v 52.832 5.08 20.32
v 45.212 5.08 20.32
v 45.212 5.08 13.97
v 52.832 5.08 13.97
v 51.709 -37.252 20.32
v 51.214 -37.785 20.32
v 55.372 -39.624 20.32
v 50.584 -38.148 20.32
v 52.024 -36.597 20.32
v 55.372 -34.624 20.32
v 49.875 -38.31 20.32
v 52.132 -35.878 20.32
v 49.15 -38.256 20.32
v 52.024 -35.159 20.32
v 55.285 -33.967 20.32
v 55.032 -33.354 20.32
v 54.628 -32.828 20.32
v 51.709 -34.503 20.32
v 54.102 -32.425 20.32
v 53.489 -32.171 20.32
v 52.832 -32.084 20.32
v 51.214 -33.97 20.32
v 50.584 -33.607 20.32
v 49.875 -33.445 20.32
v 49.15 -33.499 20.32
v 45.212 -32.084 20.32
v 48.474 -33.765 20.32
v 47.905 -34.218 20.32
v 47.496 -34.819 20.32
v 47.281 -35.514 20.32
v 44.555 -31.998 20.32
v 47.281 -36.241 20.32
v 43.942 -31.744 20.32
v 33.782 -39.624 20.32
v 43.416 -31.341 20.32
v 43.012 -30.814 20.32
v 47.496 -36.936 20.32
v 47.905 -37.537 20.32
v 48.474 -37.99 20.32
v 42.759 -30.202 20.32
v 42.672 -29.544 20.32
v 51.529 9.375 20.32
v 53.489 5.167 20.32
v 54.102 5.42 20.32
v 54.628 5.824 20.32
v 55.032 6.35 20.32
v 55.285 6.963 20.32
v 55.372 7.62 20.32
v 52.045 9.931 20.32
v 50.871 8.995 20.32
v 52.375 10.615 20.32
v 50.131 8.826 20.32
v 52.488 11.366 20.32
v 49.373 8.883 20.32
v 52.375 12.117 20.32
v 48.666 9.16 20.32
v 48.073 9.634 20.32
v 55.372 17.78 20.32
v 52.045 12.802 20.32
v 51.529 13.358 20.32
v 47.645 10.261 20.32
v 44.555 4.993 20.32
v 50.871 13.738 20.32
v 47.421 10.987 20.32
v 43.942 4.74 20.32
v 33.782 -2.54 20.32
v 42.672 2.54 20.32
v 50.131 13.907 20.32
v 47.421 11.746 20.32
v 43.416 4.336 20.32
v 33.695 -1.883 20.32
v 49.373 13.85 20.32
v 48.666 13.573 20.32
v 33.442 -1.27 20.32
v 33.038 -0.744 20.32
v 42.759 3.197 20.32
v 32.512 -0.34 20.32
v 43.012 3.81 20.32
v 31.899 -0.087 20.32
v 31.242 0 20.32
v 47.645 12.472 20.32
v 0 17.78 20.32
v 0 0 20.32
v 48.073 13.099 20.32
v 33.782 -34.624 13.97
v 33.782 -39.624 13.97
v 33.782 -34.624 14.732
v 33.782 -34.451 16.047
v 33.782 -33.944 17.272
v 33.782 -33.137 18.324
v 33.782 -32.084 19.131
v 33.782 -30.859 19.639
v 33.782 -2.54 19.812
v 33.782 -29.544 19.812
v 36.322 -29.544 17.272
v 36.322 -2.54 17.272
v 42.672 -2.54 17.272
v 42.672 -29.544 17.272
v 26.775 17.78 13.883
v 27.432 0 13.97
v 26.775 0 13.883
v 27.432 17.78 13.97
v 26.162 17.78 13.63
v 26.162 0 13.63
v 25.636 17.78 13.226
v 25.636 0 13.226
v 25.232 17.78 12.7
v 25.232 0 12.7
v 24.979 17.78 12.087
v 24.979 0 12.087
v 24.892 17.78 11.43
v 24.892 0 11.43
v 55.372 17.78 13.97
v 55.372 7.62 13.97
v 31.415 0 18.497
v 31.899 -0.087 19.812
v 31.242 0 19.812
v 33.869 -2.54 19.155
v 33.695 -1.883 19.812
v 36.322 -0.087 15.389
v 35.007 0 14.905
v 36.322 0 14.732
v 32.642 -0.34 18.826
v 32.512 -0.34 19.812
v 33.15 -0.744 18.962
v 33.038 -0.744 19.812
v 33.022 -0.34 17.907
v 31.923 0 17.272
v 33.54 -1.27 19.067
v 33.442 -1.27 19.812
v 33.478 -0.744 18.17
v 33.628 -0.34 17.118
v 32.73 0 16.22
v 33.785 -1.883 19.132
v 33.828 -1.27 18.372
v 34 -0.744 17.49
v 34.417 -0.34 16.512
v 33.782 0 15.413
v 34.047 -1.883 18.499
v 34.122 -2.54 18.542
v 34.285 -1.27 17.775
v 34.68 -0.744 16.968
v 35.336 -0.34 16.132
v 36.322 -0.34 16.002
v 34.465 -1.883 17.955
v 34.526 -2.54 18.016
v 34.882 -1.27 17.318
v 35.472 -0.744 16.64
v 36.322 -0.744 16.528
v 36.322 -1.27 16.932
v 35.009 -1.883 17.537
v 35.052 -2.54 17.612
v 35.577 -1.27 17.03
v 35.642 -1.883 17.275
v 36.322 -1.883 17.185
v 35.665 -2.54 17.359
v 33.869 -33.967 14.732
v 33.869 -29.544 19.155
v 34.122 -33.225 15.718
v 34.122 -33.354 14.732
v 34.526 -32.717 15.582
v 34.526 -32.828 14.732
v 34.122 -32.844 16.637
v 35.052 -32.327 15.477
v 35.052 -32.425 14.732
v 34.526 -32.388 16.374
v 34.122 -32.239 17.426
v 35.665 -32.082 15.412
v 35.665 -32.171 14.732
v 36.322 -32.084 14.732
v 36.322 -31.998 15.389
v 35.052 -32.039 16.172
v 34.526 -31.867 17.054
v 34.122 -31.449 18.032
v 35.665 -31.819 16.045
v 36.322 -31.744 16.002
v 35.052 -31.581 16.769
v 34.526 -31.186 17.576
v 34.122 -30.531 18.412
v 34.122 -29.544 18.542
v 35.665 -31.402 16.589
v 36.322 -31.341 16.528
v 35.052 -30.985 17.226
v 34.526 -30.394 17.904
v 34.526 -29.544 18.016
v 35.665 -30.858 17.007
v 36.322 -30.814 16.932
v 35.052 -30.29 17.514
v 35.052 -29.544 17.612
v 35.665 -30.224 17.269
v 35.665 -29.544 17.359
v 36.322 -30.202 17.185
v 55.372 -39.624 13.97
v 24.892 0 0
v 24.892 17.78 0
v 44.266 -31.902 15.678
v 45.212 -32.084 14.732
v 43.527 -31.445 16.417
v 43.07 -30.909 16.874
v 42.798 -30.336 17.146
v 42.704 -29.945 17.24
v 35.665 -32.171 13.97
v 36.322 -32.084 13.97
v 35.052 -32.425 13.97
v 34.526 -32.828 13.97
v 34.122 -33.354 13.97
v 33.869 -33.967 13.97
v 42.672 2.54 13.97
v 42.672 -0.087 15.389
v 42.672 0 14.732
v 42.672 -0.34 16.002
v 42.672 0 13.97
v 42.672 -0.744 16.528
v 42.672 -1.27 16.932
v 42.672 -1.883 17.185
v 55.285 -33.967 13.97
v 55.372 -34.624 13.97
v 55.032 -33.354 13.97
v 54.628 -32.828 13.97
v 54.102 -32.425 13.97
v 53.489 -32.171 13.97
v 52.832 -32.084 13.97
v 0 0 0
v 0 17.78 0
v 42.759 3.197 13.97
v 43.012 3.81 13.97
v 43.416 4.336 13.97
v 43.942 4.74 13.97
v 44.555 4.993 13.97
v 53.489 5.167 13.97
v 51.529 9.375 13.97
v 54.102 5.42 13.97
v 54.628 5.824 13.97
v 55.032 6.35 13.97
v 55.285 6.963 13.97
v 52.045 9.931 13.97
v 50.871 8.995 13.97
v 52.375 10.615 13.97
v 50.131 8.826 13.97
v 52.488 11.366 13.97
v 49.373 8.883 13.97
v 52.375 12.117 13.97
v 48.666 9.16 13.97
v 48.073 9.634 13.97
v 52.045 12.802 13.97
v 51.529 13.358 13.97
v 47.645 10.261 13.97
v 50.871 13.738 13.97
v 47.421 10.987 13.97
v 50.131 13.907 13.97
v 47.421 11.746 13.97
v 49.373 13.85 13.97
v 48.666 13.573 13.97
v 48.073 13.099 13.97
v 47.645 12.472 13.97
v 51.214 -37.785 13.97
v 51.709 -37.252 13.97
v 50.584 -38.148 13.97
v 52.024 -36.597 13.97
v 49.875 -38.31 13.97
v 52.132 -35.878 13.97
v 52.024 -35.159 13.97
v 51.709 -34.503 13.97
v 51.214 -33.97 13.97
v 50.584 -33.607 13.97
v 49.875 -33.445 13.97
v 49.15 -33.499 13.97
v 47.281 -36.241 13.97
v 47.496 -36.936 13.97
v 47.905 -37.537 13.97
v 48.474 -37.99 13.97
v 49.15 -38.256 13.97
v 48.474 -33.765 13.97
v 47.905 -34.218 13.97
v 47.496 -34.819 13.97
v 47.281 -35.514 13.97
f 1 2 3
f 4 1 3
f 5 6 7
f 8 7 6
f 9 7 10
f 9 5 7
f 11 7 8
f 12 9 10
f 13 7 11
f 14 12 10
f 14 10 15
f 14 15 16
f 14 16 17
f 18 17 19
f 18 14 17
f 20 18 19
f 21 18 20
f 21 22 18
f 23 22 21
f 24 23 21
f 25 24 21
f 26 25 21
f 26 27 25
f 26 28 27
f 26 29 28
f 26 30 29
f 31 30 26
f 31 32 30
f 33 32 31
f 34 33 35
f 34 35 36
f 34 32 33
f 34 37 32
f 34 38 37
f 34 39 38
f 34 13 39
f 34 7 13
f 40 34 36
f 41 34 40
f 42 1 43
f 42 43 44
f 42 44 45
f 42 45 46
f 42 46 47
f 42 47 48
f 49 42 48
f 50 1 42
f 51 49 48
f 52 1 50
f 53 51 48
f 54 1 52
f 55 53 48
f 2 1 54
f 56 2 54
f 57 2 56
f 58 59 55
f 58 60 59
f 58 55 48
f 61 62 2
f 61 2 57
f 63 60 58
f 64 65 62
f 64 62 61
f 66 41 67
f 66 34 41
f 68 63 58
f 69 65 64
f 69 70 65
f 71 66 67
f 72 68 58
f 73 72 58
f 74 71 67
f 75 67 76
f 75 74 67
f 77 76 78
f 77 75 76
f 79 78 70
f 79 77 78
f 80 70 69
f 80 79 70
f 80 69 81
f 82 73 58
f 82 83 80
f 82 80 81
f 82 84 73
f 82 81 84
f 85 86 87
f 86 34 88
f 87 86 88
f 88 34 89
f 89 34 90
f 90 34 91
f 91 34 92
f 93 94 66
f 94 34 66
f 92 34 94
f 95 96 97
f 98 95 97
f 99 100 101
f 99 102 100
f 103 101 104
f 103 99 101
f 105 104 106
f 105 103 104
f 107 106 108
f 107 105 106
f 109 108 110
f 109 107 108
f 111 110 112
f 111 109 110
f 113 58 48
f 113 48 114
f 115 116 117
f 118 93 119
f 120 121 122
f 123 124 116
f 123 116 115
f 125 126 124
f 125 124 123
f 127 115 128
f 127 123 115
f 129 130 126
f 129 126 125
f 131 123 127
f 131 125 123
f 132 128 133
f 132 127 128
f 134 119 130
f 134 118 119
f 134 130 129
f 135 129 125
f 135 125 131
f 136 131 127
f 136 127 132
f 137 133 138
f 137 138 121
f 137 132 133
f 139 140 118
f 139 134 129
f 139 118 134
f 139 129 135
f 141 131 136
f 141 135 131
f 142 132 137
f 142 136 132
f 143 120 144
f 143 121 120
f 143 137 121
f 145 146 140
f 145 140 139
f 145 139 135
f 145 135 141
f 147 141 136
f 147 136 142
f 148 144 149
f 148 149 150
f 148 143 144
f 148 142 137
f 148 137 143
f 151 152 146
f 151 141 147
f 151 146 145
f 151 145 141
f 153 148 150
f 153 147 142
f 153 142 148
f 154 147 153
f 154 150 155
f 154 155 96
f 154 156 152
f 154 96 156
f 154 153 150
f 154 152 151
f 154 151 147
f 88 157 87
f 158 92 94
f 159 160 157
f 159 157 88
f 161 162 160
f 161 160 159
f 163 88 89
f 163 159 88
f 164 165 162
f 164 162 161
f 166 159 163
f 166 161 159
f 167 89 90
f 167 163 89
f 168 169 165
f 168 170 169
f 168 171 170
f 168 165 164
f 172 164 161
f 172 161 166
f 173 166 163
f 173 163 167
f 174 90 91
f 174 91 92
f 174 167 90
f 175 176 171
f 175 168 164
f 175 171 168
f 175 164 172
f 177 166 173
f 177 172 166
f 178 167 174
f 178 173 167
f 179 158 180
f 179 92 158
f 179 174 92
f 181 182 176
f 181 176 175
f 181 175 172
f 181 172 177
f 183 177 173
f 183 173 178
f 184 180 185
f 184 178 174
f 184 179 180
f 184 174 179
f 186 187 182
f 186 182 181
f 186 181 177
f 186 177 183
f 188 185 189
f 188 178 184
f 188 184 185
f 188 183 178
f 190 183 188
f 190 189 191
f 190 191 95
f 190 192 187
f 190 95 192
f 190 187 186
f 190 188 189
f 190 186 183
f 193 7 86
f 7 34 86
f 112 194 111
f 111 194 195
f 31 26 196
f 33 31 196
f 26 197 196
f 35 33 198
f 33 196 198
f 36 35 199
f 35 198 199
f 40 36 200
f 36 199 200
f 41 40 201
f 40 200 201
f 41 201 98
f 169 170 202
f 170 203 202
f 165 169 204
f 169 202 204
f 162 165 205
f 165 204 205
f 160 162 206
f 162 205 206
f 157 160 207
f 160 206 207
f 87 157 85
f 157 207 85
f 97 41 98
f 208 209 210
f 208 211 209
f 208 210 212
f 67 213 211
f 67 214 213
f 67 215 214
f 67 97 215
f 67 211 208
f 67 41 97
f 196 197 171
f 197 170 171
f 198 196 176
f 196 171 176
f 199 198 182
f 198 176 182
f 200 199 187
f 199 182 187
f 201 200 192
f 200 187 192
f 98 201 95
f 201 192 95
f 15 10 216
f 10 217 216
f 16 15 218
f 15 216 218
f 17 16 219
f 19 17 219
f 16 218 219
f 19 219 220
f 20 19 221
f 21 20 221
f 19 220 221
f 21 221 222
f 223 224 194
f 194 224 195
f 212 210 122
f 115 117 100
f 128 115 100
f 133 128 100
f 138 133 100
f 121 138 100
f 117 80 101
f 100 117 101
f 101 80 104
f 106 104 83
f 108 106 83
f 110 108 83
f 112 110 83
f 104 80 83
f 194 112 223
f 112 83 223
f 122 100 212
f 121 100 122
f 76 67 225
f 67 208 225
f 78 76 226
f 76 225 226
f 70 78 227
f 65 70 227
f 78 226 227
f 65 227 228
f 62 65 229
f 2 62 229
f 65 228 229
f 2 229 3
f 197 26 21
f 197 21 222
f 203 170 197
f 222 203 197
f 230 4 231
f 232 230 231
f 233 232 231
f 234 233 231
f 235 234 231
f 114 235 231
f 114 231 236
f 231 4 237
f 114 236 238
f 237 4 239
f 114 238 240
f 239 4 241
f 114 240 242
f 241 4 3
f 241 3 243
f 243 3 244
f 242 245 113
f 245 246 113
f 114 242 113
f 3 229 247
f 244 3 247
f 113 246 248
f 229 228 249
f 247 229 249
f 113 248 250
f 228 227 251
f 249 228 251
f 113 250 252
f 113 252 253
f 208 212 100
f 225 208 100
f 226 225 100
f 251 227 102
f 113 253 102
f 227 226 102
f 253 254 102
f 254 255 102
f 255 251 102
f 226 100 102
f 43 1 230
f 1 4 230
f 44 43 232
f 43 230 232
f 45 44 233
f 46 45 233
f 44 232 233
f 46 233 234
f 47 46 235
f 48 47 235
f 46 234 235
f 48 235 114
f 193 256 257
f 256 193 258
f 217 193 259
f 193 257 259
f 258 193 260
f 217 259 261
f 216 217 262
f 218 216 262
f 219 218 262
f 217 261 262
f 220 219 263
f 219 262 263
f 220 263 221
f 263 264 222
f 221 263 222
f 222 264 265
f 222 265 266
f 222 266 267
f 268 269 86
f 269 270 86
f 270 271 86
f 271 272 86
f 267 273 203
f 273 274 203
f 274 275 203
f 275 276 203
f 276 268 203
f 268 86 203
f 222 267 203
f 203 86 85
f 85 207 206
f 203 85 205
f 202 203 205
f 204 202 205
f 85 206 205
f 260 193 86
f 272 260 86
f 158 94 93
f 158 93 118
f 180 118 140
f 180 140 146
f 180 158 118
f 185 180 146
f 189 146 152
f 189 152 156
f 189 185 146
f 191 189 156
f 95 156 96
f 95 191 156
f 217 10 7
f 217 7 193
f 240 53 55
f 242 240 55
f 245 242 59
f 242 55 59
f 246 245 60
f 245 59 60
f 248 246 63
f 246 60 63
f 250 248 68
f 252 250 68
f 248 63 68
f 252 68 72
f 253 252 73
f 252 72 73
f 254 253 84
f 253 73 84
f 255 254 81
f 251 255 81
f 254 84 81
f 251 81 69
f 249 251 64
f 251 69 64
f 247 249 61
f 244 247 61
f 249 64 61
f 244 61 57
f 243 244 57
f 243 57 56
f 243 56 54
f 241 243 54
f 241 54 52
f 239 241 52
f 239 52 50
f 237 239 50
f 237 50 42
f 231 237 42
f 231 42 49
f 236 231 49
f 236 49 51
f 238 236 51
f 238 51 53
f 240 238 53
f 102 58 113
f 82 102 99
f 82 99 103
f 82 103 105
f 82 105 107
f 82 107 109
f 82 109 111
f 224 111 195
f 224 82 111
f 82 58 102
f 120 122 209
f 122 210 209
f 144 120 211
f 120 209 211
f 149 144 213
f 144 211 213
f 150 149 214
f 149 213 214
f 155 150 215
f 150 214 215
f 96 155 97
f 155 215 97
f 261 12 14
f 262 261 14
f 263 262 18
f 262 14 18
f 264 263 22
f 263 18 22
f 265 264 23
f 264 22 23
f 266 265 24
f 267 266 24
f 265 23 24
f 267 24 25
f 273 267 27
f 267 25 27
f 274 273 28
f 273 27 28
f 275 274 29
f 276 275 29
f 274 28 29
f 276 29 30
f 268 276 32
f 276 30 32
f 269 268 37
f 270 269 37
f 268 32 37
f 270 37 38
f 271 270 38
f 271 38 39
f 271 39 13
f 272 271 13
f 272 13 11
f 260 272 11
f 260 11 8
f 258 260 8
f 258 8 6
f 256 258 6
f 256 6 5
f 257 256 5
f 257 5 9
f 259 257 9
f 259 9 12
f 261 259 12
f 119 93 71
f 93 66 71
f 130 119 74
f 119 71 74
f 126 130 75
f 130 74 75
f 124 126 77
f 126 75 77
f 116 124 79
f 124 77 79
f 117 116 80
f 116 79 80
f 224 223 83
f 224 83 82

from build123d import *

# Parameters (mm, degrees)
SKETCH1_W            = 24.892
SKETCH1_H            = 17.78
BOSS_EXTRUDE1_DEPTH  = 20.32
SKETCH2_W            = 6.35
SKETCH2_H            = 17.78
BOSS_EXTRUDE2_DEPTH  = 17.78
SKETCH16_W           = 6.35
SKETCH16_H           = 12.7
BOSS_EXTRUDE11_DEPTH = 12.7
SKETCH20_W           = 8.89
SKETCH20_H           = 3.048
BOSS_EXTRUDE12_DEPTH = 39.624
SKETCH21_W           = 8.89
SKETCH21_H           = 7.539530378
BOSS_EXTRUDE13_DEPTH = 3.302
SKETCH22_W           = 6.35
SKETCH22_H           = 7.539530378
BOSS_EXTRUDE14_DEPTH = 12.7
SKETCH18_R           = 2.547686281
SKETCH18_R_2         = 2.439237793
CUT_EXTRUDE11_DEPTH  = 72.056471626
FILLET8_R            = 2.54


with BuildPart() as part:
    # Sketch1 → Boss-Extrude1 (new body)
    with BuildSketch(Plane.XY):
        with Locations((12.446, 8.89)):
            Rectangle(SKETCH1_W, SKETCH1_H)
    extrude(amount=BOSS_EXTRUDE1_DEPTH)

    # Sketch2 → Boss-Extrude2 (add)
    with BuildSketch(Plane(origin=(24.892, 0, 0), x_dir=(0, 0, -1), z_dir=(1, 0, 0))):
        with Locations((-17.145, 8.89)):
            Rectangle(SKETCH2_W, SKETCH2_H)
    extrude(amount=BOSS_EXTRUDE2_DEPTH)

    # Sketch16 → Boss-Extrude11 (add)
    with BuildSketch(Plane(origin=(42.672, 0, 0), x_dir=(0, 0, -1), z_dir=(1, 0, 0))):
        with Locations((-17.145, 11.43)):
            Rectangle(SKETCH16_W, SKETCH16_H)
    extrude(amount=BOSS_EXTRUDE11_DEPTH)

    # Sketch20 → Boss-Extrude12 (add)
    with BuildSketch(Plane.XZ):
        with Locations((38.227, 18.796)):
            Rectangle(SKETCH20_W, SKETCH20_H)
    extrude(amount=BOSS_EXTRUDE12_DEPTH)

    # Sketch21 → Boss-Extrude13 (add)
    with BuildSketch(Plane(origin=(0, 0, 17.272), x_dir=(-1, 0, 0), z_dir=(0, 0, -1))):
        with Locations((-38.227, -35.854234811)):
            Rectangle(SKETCH21_W, SKETCH21_H)
    extrude(amount=BOSS_EXTRUDE13_DEPTH)

    # Sketch22 → Boss-Extrude14 (add)
    with BuildSketch(Plane(origin=(42.672, 0, 0), x_dir=(0, 0, -1), z_dir=(1, 0, 0))):
        with Locations((-17.145, -35.854234811)):
            Rectangle(SKETCH22_W, SKETCH22_H)
    extrude(amount=BOSS_EXTRUDE14_DEPTH)

    # Sketch18 → Cut-Extrude11 (cut, through all)
    with BuildSketch(Plane.XY.offset(20.32)):
        with Locations((49.940213472, 11.366437705)):
            Circle(SKETCH18_R)
        with Locations((49.693177742, -35.877562295)):
            Circle(SKETCH18_R_2)
    extrude(amount=-CUT_EXTRUDE11_DEPTH, mode=Mode.SUBTRACT)

    # Fillet8
    fillet8_edges = [part.edges().sort_by_distance(p)[0] for p in [
        (24.892, 8.89, 13.97),
        (42.672, 5.08, 17.145),
        (55.372, 5.08, 17.145),
        (33.782, 0, 18.796),
        (38.227, 0, 17.272),
        (33.782, -16.042234811, 17.272),
        (38.227, -32.084469622, 17.272),
        (33.782, -32.084469622, 15.621),
        (42.672, -32.084469622, 18.796),
        (55.372, -32.084469622, 17.145),
    ]]
    fillet(fillet8_edges, radius=FILLET8_R)


solid = part.part
